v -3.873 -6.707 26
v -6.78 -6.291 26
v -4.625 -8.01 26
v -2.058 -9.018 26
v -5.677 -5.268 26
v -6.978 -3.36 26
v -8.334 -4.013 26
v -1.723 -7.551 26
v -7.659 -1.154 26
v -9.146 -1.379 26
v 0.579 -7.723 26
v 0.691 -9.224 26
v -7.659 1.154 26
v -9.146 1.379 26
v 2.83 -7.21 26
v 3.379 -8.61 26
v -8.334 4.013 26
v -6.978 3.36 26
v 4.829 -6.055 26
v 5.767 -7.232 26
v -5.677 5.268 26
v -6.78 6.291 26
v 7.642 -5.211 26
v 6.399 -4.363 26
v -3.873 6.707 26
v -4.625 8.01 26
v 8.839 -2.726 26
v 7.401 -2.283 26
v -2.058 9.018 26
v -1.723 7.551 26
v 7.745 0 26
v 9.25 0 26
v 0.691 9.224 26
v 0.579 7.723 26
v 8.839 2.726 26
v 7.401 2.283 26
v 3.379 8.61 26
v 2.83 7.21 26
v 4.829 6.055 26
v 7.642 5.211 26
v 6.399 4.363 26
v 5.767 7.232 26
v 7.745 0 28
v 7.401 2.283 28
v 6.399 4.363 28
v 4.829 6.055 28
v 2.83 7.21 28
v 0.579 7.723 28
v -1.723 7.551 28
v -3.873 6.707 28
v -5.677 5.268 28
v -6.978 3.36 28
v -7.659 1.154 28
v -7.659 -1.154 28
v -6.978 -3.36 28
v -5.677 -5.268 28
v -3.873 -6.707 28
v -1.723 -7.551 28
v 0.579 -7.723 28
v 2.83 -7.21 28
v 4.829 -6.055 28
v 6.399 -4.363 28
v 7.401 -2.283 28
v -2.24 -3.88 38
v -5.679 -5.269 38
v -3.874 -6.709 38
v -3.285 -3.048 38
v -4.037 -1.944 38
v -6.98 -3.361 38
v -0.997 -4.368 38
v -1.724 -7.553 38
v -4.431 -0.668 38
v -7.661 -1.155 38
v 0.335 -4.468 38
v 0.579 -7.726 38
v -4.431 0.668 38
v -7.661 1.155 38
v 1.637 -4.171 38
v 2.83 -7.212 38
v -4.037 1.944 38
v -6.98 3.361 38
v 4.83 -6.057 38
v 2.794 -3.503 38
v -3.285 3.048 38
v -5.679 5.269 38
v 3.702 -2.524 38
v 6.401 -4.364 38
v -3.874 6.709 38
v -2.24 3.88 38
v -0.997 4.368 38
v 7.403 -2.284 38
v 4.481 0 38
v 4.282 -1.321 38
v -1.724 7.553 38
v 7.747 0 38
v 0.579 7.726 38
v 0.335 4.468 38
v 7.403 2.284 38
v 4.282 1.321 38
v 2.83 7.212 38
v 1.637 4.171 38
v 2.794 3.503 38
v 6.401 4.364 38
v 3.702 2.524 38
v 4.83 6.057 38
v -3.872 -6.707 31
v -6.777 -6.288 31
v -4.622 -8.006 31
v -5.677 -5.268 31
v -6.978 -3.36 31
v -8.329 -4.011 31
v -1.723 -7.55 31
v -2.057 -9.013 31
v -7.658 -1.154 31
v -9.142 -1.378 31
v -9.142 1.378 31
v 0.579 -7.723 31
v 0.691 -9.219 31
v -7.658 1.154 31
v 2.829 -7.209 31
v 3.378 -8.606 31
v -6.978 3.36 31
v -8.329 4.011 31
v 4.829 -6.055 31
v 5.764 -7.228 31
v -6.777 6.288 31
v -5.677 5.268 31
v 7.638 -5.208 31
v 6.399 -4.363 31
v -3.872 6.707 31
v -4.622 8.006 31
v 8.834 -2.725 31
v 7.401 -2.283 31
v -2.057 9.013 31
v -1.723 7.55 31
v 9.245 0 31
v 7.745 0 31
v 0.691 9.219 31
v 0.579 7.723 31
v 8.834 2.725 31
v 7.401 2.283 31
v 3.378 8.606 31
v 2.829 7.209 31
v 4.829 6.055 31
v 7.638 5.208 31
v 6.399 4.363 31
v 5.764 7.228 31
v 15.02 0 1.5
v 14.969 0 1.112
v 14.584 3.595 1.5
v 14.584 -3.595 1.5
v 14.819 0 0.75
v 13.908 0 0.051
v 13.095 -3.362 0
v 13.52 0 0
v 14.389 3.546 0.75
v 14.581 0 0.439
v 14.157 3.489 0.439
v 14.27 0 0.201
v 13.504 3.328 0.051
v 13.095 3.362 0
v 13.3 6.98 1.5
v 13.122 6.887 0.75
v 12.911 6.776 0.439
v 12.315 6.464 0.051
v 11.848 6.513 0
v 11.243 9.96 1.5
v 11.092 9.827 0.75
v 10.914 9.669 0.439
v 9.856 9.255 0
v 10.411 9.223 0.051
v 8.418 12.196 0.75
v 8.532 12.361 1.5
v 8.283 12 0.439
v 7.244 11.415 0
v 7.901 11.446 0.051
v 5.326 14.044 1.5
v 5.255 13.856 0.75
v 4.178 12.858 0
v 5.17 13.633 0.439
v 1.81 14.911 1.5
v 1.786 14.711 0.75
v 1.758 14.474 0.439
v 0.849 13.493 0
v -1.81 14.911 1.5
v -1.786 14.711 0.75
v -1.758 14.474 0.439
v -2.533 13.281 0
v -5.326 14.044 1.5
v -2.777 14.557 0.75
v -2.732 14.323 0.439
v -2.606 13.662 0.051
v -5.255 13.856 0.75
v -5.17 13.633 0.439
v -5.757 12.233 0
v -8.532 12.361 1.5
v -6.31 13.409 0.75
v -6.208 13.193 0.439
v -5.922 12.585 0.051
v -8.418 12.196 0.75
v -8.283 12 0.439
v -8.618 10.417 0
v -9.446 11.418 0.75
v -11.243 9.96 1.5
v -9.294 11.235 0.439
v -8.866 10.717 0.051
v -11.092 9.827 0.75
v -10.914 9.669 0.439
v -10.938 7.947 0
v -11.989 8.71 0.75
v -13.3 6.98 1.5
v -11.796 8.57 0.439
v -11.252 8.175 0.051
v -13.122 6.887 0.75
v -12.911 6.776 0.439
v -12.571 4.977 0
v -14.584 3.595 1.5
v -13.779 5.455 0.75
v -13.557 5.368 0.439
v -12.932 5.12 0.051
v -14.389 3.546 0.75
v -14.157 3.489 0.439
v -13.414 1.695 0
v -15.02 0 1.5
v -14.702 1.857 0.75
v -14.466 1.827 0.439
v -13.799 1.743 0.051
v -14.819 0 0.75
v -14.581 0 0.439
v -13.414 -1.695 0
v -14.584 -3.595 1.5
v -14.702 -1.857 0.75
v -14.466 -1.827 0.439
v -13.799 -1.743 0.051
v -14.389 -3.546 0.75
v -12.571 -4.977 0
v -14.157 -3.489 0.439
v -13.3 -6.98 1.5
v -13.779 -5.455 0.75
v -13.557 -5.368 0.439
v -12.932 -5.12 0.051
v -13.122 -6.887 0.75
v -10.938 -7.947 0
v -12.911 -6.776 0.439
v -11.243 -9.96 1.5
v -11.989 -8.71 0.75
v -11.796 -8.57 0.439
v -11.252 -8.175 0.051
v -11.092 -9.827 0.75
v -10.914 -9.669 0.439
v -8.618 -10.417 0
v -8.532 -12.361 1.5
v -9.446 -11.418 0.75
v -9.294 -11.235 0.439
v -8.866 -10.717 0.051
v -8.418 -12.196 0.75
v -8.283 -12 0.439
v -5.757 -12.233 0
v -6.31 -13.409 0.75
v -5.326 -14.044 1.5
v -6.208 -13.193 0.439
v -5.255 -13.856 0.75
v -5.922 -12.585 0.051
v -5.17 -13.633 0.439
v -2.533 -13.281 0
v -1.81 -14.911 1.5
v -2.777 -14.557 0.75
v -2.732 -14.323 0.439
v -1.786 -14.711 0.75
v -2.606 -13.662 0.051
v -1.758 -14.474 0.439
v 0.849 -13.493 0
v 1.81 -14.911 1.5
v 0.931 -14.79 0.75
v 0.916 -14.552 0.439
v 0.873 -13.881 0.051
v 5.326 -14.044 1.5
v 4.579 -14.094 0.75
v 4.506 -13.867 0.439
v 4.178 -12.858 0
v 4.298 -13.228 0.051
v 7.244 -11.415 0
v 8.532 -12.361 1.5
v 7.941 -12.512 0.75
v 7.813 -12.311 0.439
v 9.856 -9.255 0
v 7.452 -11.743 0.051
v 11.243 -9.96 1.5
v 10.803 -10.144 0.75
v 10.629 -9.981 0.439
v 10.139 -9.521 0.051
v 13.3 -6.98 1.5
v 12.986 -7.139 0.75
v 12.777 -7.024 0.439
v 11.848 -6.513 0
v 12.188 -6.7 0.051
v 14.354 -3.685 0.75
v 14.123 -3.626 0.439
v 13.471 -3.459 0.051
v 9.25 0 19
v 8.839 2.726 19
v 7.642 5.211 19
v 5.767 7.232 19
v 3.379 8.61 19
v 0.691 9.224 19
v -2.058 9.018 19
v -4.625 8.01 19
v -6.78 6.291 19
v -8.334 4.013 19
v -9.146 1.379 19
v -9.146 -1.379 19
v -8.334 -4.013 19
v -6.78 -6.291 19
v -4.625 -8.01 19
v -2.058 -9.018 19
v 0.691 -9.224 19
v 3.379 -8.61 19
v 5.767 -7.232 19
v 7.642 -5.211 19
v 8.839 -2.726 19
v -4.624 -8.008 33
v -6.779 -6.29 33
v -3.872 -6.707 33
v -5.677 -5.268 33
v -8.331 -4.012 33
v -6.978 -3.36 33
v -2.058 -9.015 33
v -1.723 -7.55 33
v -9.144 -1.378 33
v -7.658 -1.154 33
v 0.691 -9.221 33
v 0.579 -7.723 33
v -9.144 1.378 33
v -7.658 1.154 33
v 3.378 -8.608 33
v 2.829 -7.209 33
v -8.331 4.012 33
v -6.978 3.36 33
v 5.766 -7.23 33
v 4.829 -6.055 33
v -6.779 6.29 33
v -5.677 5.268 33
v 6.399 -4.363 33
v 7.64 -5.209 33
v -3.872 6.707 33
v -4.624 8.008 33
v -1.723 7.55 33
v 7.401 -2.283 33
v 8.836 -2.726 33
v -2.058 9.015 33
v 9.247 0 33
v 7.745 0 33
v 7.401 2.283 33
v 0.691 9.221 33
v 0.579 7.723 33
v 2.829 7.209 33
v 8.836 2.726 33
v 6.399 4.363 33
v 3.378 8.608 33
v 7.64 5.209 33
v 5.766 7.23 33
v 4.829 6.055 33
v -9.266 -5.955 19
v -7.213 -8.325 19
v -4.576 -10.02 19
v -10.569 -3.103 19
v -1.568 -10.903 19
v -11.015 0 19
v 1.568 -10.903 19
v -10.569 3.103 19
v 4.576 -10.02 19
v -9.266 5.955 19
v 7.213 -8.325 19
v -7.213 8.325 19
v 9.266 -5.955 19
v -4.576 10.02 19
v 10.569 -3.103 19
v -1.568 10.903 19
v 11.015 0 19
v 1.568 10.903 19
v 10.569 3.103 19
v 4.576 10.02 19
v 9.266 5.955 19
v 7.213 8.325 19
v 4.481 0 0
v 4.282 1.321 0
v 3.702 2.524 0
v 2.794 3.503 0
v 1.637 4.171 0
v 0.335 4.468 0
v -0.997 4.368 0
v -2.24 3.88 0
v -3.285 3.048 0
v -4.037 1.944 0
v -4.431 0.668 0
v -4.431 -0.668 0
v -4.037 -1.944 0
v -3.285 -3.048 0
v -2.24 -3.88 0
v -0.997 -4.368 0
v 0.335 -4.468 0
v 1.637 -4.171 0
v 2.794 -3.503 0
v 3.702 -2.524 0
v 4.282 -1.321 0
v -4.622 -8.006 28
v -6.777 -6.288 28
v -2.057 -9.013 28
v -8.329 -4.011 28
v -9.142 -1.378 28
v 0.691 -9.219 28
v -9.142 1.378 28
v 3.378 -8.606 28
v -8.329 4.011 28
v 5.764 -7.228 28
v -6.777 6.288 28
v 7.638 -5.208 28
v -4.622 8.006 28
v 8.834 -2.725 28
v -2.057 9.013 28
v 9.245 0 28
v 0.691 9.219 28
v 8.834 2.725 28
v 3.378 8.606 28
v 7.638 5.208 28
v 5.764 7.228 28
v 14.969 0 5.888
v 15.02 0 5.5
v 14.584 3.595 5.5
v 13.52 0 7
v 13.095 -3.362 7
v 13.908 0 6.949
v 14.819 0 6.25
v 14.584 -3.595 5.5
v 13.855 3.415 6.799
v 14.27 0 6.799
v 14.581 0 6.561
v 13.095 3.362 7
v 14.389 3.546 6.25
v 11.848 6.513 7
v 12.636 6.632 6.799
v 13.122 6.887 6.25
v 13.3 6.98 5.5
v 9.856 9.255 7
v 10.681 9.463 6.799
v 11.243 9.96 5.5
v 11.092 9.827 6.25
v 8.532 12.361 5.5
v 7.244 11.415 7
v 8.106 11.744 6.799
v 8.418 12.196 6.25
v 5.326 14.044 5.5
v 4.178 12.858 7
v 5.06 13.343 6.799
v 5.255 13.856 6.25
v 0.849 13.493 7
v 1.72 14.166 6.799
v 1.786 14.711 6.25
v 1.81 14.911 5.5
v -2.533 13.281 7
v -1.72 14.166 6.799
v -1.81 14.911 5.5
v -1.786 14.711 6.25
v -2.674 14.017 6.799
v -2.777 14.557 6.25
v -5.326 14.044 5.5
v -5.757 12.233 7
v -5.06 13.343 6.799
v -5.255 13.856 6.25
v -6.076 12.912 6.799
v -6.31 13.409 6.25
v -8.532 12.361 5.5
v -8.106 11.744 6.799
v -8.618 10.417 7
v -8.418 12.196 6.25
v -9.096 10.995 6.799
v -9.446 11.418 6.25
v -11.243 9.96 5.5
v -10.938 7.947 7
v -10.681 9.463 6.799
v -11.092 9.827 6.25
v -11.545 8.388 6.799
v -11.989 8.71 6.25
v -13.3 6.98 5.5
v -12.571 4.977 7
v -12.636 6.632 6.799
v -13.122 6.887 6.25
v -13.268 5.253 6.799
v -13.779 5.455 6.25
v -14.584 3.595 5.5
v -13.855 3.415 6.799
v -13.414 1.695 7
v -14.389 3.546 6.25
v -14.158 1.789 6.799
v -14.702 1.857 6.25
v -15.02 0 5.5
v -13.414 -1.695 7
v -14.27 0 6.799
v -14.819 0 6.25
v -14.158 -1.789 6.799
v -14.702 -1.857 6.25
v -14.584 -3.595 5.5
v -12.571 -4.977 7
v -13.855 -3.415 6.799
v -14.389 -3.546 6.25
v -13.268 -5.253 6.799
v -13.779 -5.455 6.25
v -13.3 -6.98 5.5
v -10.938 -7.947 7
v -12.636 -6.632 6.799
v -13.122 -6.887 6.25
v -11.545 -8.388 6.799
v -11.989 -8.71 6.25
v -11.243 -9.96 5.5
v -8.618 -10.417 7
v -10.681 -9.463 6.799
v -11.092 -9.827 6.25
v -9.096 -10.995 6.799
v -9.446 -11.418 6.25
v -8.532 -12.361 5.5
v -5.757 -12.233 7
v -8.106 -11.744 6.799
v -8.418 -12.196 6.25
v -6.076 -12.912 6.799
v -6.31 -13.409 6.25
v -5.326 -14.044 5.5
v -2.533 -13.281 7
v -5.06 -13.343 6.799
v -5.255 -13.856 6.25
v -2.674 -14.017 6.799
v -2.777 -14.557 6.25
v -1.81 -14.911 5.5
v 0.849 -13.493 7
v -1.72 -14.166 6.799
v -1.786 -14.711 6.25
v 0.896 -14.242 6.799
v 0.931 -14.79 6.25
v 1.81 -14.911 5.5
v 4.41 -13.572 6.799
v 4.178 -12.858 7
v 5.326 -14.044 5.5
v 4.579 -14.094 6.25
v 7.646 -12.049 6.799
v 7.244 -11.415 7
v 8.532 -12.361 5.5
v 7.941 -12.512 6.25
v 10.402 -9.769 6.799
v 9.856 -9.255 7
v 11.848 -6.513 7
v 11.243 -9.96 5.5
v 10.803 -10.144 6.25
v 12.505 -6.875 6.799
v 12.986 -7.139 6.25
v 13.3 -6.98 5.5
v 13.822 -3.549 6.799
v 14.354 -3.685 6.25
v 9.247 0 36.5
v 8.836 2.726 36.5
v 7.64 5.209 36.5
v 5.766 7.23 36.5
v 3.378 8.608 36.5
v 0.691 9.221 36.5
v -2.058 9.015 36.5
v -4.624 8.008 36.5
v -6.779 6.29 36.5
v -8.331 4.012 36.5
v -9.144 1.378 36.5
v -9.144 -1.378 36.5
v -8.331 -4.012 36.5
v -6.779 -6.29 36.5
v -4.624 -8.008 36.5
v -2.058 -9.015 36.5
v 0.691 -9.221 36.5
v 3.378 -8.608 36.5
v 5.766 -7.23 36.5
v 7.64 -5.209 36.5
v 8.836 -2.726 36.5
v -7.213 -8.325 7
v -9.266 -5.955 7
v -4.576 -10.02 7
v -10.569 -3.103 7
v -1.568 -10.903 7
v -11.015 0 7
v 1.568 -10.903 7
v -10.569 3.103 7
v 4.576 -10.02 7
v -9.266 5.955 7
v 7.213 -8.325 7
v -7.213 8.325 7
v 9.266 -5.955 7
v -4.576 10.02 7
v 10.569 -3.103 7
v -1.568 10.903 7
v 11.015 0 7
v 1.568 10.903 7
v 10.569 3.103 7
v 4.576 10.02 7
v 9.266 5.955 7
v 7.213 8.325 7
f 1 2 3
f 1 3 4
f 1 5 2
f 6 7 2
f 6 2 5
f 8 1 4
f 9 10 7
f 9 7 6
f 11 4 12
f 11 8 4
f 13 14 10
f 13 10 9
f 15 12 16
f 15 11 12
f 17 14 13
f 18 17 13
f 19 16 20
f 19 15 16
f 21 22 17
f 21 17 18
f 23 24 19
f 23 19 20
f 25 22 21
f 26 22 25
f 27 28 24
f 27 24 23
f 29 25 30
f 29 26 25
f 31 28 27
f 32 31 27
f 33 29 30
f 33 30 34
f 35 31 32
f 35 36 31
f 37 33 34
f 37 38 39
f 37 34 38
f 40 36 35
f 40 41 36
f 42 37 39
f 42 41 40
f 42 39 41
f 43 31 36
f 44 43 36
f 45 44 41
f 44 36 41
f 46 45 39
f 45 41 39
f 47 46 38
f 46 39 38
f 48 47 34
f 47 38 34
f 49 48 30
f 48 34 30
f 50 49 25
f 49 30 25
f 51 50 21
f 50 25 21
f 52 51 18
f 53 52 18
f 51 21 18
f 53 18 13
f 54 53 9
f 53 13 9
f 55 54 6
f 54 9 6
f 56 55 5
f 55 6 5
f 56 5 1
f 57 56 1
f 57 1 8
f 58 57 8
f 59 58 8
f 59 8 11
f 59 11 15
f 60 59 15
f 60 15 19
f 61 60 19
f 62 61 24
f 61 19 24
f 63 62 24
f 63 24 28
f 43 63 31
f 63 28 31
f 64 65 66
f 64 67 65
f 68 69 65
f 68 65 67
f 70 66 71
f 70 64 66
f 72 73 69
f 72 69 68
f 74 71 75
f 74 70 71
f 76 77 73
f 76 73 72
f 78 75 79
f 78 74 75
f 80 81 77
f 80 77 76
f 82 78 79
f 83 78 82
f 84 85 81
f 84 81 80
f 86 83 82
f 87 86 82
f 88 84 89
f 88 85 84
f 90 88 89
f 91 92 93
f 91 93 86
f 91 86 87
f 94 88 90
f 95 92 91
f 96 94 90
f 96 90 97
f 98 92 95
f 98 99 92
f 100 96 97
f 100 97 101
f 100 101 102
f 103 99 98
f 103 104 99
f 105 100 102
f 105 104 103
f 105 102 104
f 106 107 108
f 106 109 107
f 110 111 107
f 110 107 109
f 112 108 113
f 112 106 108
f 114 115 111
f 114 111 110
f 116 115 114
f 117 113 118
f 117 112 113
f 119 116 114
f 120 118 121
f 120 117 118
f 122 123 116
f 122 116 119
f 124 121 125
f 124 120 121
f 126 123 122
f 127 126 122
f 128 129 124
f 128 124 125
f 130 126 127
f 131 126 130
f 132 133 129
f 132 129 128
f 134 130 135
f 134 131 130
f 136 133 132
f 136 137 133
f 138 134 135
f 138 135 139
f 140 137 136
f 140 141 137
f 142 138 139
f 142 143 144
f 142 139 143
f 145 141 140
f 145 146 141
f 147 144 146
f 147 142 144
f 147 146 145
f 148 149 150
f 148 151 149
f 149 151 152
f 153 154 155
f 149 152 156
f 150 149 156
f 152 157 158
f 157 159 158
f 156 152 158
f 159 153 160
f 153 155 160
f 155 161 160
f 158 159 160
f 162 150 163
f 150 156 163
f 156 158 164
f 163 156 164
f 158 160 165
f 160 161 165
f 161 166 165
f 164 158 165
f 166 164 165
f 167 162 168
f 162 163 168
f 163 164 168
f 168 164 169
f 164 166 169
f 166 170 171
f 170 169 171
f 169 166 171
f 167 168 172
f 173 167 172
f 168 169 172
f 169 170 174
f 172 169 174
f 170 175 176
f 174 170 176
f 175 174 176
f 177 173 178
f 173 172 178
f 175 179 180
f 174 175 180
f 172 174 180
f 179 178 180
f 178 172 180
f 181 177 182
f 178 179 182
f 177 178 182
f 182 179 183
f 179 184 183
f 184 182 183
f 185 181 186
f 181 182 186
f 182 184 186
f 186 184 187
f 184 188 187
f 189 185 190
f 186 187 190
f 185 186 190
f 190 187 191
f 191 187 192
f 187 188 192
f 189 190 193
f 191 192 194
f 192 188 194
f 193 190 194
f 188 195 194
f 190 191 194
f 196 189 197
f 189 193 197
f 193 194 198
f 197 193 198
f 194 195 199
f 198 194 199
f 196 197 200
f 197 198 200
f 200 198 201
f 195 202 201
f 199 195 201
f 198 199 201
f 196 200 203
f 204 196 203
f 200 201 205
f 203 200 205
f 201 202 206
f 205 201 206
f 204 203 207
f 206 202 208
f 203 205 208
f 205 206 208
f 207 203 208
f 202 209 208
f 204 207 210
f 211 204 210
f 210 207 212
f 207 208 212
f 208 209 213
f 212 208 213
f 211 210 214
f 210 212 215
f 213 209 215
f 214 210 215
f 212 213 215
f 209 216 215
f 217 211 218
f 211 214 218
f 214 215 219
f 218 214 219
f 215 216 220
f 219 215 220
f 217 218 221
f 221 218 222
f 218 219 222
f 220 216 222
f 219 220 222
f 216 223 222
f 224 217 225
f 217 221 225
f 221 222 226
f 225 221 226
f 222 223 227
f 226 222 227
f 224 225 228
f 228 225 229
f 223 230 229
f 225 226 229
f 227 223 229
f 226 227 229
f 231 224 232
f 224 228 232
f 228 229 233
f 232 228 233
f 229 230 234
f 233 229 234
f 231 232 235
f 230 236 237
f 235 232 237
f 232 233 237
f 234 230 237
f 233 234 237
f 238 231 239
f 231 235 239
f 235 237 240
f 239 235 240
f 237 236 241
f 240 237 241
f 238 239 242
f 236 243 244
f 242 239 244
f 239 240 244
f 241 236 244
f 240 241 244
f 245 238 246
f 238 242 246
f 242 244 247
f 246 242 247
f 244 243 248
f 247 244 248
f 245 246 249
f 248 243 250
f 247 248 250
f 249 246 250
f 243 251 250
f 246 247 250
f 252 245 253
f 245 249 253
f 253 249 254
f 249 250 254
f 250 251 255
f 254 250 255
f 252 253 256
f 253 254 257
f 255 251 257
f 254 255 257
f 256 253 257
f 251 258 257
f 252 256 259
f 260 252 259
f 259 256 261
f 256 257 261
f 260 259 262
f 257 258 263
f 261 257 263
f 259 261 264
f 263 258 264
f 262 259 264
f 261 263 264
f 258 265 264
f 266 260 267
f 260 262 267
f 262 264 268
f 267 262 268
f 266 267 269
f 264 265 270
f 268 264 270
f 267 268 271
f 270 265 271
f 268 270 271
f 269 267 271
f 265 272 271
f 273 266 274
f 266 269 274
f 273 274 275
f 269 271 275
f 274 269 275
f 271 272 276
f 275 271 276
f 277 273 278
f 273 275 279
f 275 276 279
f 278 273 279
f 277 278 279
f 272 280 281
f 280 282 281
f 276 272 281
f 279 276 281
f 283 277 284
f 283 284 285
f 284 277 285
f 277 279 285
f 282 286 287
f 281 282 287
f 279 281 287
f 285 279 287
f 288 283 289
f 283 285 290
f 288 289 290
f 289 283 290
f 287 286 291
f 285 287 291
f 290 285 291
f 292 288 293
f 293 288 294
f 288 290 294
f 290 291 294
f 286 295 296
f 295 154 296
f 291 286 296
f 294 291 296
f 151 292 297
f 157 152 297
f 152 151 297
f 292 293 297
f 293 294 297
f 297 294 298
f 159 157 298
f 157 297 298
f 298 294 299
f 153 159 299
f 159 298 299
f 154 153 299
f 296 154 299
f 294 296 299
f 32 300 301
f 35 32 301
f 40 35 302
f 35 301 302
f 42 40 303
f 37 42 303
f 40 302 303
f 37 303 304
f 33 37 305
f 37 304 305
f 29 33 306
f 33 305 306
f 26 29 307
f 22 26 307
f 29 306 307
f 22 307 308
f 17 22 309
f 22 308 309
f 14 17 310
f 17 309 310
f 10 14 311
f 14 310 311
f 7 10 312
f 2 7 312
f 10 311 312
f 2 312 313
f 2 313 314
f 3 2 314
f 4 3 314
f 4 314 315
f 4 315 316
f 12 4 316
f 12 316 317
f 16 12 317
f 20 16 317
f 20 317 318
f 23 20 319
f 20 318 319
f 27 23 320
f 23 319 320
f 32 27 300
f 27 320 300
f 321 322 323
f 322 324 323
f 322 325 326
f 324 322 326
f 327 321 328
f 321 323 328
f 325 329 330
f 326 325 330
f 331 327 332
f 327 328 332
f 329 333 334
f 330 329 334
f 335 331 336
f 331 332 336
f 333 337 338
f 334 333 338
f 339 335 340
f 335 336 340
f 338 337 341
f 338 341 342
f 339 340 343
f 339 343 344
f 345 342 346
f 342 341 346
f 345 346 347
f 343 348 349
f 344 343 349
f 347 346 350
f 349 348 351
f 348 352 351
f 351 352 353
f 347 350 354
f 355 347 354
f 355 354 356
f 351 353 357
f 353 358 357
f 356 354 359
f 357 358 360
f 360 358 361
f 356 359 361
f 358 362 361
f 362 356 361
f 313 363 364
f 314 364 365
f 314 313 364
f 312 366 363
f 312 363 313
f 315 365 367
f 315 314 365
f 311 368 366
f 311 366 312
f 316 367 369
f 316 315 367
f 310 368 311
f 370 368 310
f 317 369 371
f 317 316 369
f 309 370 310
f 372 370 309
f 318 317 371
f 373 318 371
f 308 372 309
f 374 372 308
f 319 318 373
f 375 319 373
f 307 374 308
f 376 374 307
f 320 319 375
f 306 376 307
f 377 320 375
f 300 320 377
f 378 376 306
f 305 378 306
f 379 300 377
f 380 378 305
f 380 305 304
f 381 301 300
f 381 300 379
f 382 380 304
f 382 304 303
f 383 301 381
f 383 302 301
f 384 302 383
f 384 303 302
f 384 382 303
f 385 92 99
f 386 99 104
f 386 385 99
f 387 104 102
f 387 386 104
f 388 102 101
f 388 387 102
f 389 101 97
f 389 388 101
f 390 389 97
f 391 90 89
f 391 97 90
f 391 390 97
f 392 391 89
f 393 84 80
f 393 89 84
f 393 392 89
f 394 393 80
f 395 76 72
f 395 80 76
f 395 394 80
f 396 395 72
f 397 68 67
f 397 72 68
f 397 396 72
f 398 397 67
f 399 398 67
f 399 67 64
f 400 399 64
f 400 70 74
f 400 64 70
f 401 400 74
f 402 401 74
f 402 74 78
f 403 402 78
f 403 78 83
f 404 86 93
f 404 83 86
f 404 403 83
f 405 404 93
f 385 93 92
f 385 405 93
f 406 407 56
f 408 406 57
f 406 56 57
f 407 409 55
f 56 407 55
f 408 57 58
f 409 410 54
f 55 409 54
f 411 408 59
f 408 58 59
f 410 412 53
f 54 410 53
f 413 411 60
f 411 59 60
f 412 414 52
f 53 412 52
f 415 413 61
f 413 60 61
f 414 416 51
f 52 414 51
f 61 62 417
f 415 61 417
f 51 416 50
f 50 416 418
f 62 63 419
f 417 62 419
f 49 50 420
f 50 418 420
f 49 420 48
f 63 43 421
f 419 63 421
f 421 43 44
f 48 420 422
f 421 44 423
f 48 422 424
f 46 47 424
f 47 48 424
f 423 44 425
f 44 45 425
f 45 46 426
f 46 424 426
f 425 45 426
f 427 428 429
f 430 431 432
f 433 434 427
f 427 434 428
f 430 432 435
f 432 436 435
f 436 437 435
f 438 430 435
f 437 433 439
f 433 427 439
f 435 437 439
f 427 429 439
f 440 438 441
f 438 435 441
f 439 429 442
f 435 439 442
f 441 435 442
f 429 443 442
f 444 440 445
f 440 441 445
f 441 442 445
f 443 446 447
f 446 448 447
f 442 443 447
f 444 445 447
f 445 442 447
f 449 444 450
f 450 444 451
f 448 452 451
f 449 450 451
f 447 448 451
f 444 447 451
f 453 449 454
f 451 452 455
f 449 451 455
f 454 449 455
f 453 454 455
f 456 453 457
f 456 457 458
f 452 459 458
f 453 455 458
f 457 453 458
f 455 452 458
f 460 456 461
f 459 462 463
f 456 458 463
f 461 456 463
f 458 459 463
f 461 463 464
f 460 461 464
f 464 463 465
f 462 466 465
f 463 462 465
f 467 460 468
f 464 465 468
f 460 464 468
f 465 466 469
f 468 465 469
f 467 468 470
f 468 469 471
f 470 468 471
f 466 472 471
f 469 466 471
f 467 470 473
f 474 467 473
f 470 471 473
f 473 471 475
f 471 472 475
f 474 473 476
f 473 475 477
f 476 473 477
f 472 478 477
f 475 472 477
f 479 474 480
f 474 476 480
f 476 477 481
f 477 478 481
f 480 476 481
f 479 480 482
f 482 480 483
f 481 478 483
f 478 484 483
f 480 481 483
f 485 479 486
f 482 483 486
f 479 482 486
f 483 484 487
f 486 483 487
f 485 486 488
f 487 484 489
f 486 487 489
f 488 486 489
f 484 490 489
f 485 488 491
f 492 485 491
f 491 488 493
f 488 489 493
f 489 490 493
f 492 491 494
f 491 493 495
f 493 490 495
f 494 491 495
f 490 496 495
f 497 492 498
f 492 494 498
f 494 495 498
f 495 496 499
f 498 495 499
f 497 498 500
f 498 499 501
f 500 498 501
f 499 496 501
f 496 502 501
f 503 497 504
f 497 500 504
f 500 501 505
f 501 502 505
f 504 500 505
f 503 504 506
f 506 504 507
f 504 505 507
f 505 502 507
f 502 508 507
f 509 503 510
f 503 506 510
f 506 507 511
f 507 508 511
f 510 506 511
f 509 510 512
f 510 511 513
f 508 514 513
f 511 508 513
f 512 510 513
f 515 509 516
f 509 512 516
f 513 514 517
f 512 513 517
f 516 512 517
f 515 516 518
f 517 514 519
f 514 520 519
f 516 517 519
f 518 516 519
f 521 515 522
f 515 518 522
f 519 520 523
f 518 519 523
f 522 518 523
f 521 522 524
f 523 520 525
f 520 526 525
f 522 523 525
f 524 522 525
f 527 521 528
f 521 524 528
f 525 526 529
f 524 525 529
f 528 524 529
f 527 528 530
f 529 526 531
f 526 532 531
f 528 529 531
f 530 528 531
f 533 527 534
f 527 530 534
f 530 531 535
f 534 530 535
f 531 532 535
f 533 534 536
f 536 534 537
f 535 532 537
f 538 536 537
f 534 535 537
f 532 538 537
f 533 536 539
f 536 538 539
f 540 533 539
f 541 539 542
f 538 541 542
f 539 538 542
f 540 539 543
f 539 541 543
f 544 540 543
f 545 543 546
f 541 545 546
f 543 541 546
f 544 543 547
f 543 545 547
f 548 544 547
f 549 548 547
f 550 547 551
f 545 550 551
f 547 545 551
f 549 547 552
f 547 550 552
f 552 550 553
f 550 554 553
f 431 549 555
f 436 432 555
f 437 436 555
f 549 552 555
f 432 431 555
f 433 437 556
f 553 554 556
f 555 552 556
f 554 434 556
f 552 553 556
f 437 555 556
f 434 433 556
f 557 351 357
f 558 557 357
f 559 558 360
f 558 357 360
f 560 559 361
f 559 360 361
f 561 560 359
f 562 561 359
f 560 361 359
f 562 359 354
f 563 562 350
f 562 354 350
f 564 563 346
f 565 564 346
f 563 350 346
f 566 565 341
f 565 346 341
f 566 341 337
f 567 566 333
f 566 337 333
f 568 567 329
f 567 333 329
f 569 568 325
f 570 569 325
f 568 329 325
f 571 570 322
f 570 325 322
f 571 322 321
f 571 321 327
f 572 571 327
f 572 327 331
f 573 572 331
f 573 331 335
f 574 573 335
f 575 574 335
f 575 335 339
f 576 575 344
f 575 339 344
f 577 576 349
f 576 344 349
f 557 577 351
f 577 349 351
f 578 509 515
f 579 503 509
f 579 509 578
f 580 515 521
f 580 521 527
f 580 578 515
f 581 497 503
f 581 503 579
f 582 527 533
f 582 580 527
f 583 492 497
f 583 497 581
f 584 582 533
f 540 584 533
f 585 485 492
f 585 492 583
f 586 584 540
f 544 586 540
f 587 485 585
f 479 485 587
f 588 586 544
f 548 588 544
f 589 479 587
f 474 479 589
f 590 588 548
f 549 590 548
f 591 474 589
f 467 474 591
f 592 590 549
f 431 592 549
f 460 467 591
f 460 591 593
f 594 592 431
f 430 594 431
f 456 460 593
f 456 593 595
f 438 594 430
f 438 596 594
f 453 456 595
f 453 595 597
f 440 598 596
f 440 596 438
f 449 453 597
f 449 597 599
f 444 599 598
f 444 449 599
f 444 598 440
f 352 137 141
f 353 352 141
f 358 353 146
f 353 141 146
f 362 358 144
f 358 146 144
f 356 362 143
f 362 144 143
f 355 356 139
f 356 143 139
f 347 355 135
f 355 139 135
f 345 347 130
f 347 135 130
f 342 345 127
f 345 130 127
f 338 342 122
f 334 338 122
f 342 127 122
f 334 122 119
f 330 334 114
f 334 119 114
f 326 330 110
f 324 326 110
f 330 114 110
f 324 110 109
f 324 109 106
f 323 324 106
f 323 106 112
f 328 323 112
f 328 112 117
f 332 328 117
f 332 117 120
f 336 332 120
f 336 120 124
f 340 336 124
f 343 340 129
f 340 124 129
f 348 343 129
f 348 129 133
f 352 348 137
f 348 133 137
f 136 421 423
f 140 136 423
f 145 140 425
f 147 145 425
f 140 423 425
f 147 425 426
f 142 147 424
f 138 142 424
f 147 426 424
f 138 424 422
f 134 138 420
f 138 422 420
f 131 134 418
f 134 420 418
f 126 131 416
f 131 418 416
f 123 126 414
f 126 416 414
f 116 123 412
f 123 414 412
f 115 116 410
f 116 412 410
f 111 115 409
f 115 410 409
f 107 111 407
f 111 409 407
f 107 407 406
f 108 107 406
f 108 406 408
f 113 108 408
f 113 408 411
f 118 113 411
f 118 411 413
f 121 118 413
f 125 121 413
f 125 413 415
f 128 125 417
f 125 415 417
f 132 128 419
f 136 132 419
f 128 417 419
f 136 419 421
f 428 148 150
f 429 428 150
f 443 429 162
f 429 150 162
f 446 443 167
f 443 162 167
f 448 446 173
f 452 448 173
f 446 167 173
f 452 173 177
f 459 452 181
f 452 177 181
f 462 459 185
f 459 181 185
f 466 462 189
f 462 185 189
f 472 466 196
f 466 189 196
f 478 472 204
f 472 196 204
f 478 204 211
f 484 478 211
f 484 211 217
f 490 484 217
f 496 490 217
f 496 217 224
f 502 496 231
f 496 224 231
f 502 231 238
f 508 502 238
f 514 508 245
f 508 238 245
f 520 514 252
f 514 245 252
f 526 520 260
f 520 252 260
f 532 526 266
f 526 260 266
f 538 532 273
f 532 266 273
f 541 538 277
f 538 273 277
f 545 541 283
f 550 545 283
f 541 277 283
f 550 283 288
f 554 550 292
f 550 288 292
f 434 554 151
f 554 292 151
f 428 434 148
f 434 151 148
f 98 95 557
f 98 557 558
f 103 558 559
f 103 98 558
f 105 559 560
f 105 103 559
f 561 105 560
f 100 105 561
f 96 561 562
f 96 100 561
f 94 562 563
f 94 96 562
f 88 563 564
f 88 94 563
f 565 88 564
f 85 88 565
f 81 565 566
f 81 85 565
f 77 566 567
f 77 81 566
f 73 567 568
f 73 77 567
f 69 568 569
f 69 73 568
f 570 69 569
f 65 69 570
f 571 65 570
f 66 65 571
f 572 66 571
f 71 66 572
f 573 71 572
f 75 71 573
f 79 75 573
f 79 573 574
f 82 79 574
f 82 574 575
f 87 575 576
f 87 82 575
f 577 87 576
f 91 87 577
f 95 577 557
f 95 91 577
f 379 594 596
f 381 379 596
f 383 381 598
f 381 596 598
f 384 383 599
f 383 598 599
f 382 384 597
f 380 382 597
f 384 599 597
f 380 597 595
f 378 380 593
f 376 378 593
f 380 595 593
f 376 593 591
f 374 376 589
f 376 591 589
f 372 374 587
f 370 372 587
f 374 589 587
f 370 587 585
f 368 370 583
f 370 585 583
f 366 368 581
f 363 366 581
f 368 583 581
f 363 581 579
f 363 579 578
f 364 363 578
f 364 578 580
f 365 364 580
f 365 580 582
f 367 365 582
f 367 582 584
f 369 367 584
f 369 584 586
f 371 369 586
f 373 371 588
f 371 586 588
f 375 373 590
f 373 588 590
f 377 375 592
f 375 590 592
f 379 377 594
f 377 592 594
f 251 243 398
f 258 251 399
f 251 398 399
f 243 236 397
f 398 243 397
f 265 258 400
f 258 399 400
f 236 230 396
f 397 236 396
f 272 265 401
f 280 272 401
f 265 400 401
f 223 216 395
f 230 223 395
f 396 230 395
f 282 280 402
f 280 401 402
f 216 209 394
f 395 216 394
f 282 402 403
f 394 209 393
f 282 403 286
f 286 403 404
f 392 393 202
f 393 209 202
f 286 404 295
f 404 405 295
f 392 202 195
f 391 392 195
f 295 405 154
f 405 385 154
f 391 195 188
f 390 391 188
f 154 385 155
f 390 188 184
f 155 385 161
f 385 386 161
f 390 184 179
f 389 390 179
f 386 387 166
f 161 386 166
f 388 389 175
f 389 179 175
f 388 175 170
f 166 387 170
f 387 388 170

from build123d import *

# Parameters (mm, degrees)
F0_R      = 15.020122
F1_DEPTH  = 7
F2_R      = 11.015093
F3_DEPTH  = 12
F4_R      = 9.249668
F5_DEPTH  = 7
F6_R      = 7.745011
F7_DEPTH  = 2
F8_R      = 9.244849
F9_DEPTH  = 3
F10_R     = 7.744613
F11_DEPTH = 2
F12_R     = 9.247202
F13_DEPTH = 5
F14_SIZE  = 1.5
F15_R     = 1.5
F16_R     = 4.480588
F17_DEPTH = 50


with BuildPart() as f1:
    # F0 (on Top) → F1 (new body)
    with BuildSketch(Plane.XY):
        Circle(F0_R)
    extrude(amount=F1_DEPTH)

    # F2 (on face) → F3 (join)
    with BuildSketch(Plane.XY.offset(7)):
        Circle(F2_R)
    extrude(amount=F3_DEPTH)

    # F4 (on face) → F5 (join)
    with BuildSketch(Plane.XY.offset(19)):
        Circle(F4_R)
    extrude(amount=F5_DEPTH)

    # F6 (on face) → F7 (join)
    with BuildSketch(Plane.XY.offset(26)):
        Circle(F6_R)
    extrude(amount=F7_DEPTH)

    # F8 (on face) → F9 (join)
    with BuildSketch(Plane.XY.offset(28)):
        Circle(F8_R)
    extrude(amount=F9_DEPTH)

    # F10 (on face) → F11 (join)
    with BuildSketch(Plane.XY.offset(31)):
        Circle(F10_R)
    extrude(amount=F11_DEPTH)

    # F12 (on face) → F13 (join)
    with BuildSketch(Plane.XY.offset(33)):
        Circle(F12_R)
    extrude(amount=F13_DEPTH)

    # F14
    f14_edges = [f1.edges().sort_by_distance(p)[0] for p in [
        (-9.247202, 0, 38),
    ]]
    chamfer(f14_edges, length=F14_SIZE)

    # F15
    f15_edges = [f1.edges().sort_by_distance(p)[0] for p in [
        (-15.020122, 0, 7),
        (-15.020122, 0, 0),
    ]]
    fillet(f15_edges, radius=F15_R)

    # F16 (on Top) → F17 (cut)
    with BuildSketch(Plane.XY):
        Circle(F16_R)
    extrude(amount=F17_DEPTH, mode=Mode.SUBTRACT)


solid = f1.part
